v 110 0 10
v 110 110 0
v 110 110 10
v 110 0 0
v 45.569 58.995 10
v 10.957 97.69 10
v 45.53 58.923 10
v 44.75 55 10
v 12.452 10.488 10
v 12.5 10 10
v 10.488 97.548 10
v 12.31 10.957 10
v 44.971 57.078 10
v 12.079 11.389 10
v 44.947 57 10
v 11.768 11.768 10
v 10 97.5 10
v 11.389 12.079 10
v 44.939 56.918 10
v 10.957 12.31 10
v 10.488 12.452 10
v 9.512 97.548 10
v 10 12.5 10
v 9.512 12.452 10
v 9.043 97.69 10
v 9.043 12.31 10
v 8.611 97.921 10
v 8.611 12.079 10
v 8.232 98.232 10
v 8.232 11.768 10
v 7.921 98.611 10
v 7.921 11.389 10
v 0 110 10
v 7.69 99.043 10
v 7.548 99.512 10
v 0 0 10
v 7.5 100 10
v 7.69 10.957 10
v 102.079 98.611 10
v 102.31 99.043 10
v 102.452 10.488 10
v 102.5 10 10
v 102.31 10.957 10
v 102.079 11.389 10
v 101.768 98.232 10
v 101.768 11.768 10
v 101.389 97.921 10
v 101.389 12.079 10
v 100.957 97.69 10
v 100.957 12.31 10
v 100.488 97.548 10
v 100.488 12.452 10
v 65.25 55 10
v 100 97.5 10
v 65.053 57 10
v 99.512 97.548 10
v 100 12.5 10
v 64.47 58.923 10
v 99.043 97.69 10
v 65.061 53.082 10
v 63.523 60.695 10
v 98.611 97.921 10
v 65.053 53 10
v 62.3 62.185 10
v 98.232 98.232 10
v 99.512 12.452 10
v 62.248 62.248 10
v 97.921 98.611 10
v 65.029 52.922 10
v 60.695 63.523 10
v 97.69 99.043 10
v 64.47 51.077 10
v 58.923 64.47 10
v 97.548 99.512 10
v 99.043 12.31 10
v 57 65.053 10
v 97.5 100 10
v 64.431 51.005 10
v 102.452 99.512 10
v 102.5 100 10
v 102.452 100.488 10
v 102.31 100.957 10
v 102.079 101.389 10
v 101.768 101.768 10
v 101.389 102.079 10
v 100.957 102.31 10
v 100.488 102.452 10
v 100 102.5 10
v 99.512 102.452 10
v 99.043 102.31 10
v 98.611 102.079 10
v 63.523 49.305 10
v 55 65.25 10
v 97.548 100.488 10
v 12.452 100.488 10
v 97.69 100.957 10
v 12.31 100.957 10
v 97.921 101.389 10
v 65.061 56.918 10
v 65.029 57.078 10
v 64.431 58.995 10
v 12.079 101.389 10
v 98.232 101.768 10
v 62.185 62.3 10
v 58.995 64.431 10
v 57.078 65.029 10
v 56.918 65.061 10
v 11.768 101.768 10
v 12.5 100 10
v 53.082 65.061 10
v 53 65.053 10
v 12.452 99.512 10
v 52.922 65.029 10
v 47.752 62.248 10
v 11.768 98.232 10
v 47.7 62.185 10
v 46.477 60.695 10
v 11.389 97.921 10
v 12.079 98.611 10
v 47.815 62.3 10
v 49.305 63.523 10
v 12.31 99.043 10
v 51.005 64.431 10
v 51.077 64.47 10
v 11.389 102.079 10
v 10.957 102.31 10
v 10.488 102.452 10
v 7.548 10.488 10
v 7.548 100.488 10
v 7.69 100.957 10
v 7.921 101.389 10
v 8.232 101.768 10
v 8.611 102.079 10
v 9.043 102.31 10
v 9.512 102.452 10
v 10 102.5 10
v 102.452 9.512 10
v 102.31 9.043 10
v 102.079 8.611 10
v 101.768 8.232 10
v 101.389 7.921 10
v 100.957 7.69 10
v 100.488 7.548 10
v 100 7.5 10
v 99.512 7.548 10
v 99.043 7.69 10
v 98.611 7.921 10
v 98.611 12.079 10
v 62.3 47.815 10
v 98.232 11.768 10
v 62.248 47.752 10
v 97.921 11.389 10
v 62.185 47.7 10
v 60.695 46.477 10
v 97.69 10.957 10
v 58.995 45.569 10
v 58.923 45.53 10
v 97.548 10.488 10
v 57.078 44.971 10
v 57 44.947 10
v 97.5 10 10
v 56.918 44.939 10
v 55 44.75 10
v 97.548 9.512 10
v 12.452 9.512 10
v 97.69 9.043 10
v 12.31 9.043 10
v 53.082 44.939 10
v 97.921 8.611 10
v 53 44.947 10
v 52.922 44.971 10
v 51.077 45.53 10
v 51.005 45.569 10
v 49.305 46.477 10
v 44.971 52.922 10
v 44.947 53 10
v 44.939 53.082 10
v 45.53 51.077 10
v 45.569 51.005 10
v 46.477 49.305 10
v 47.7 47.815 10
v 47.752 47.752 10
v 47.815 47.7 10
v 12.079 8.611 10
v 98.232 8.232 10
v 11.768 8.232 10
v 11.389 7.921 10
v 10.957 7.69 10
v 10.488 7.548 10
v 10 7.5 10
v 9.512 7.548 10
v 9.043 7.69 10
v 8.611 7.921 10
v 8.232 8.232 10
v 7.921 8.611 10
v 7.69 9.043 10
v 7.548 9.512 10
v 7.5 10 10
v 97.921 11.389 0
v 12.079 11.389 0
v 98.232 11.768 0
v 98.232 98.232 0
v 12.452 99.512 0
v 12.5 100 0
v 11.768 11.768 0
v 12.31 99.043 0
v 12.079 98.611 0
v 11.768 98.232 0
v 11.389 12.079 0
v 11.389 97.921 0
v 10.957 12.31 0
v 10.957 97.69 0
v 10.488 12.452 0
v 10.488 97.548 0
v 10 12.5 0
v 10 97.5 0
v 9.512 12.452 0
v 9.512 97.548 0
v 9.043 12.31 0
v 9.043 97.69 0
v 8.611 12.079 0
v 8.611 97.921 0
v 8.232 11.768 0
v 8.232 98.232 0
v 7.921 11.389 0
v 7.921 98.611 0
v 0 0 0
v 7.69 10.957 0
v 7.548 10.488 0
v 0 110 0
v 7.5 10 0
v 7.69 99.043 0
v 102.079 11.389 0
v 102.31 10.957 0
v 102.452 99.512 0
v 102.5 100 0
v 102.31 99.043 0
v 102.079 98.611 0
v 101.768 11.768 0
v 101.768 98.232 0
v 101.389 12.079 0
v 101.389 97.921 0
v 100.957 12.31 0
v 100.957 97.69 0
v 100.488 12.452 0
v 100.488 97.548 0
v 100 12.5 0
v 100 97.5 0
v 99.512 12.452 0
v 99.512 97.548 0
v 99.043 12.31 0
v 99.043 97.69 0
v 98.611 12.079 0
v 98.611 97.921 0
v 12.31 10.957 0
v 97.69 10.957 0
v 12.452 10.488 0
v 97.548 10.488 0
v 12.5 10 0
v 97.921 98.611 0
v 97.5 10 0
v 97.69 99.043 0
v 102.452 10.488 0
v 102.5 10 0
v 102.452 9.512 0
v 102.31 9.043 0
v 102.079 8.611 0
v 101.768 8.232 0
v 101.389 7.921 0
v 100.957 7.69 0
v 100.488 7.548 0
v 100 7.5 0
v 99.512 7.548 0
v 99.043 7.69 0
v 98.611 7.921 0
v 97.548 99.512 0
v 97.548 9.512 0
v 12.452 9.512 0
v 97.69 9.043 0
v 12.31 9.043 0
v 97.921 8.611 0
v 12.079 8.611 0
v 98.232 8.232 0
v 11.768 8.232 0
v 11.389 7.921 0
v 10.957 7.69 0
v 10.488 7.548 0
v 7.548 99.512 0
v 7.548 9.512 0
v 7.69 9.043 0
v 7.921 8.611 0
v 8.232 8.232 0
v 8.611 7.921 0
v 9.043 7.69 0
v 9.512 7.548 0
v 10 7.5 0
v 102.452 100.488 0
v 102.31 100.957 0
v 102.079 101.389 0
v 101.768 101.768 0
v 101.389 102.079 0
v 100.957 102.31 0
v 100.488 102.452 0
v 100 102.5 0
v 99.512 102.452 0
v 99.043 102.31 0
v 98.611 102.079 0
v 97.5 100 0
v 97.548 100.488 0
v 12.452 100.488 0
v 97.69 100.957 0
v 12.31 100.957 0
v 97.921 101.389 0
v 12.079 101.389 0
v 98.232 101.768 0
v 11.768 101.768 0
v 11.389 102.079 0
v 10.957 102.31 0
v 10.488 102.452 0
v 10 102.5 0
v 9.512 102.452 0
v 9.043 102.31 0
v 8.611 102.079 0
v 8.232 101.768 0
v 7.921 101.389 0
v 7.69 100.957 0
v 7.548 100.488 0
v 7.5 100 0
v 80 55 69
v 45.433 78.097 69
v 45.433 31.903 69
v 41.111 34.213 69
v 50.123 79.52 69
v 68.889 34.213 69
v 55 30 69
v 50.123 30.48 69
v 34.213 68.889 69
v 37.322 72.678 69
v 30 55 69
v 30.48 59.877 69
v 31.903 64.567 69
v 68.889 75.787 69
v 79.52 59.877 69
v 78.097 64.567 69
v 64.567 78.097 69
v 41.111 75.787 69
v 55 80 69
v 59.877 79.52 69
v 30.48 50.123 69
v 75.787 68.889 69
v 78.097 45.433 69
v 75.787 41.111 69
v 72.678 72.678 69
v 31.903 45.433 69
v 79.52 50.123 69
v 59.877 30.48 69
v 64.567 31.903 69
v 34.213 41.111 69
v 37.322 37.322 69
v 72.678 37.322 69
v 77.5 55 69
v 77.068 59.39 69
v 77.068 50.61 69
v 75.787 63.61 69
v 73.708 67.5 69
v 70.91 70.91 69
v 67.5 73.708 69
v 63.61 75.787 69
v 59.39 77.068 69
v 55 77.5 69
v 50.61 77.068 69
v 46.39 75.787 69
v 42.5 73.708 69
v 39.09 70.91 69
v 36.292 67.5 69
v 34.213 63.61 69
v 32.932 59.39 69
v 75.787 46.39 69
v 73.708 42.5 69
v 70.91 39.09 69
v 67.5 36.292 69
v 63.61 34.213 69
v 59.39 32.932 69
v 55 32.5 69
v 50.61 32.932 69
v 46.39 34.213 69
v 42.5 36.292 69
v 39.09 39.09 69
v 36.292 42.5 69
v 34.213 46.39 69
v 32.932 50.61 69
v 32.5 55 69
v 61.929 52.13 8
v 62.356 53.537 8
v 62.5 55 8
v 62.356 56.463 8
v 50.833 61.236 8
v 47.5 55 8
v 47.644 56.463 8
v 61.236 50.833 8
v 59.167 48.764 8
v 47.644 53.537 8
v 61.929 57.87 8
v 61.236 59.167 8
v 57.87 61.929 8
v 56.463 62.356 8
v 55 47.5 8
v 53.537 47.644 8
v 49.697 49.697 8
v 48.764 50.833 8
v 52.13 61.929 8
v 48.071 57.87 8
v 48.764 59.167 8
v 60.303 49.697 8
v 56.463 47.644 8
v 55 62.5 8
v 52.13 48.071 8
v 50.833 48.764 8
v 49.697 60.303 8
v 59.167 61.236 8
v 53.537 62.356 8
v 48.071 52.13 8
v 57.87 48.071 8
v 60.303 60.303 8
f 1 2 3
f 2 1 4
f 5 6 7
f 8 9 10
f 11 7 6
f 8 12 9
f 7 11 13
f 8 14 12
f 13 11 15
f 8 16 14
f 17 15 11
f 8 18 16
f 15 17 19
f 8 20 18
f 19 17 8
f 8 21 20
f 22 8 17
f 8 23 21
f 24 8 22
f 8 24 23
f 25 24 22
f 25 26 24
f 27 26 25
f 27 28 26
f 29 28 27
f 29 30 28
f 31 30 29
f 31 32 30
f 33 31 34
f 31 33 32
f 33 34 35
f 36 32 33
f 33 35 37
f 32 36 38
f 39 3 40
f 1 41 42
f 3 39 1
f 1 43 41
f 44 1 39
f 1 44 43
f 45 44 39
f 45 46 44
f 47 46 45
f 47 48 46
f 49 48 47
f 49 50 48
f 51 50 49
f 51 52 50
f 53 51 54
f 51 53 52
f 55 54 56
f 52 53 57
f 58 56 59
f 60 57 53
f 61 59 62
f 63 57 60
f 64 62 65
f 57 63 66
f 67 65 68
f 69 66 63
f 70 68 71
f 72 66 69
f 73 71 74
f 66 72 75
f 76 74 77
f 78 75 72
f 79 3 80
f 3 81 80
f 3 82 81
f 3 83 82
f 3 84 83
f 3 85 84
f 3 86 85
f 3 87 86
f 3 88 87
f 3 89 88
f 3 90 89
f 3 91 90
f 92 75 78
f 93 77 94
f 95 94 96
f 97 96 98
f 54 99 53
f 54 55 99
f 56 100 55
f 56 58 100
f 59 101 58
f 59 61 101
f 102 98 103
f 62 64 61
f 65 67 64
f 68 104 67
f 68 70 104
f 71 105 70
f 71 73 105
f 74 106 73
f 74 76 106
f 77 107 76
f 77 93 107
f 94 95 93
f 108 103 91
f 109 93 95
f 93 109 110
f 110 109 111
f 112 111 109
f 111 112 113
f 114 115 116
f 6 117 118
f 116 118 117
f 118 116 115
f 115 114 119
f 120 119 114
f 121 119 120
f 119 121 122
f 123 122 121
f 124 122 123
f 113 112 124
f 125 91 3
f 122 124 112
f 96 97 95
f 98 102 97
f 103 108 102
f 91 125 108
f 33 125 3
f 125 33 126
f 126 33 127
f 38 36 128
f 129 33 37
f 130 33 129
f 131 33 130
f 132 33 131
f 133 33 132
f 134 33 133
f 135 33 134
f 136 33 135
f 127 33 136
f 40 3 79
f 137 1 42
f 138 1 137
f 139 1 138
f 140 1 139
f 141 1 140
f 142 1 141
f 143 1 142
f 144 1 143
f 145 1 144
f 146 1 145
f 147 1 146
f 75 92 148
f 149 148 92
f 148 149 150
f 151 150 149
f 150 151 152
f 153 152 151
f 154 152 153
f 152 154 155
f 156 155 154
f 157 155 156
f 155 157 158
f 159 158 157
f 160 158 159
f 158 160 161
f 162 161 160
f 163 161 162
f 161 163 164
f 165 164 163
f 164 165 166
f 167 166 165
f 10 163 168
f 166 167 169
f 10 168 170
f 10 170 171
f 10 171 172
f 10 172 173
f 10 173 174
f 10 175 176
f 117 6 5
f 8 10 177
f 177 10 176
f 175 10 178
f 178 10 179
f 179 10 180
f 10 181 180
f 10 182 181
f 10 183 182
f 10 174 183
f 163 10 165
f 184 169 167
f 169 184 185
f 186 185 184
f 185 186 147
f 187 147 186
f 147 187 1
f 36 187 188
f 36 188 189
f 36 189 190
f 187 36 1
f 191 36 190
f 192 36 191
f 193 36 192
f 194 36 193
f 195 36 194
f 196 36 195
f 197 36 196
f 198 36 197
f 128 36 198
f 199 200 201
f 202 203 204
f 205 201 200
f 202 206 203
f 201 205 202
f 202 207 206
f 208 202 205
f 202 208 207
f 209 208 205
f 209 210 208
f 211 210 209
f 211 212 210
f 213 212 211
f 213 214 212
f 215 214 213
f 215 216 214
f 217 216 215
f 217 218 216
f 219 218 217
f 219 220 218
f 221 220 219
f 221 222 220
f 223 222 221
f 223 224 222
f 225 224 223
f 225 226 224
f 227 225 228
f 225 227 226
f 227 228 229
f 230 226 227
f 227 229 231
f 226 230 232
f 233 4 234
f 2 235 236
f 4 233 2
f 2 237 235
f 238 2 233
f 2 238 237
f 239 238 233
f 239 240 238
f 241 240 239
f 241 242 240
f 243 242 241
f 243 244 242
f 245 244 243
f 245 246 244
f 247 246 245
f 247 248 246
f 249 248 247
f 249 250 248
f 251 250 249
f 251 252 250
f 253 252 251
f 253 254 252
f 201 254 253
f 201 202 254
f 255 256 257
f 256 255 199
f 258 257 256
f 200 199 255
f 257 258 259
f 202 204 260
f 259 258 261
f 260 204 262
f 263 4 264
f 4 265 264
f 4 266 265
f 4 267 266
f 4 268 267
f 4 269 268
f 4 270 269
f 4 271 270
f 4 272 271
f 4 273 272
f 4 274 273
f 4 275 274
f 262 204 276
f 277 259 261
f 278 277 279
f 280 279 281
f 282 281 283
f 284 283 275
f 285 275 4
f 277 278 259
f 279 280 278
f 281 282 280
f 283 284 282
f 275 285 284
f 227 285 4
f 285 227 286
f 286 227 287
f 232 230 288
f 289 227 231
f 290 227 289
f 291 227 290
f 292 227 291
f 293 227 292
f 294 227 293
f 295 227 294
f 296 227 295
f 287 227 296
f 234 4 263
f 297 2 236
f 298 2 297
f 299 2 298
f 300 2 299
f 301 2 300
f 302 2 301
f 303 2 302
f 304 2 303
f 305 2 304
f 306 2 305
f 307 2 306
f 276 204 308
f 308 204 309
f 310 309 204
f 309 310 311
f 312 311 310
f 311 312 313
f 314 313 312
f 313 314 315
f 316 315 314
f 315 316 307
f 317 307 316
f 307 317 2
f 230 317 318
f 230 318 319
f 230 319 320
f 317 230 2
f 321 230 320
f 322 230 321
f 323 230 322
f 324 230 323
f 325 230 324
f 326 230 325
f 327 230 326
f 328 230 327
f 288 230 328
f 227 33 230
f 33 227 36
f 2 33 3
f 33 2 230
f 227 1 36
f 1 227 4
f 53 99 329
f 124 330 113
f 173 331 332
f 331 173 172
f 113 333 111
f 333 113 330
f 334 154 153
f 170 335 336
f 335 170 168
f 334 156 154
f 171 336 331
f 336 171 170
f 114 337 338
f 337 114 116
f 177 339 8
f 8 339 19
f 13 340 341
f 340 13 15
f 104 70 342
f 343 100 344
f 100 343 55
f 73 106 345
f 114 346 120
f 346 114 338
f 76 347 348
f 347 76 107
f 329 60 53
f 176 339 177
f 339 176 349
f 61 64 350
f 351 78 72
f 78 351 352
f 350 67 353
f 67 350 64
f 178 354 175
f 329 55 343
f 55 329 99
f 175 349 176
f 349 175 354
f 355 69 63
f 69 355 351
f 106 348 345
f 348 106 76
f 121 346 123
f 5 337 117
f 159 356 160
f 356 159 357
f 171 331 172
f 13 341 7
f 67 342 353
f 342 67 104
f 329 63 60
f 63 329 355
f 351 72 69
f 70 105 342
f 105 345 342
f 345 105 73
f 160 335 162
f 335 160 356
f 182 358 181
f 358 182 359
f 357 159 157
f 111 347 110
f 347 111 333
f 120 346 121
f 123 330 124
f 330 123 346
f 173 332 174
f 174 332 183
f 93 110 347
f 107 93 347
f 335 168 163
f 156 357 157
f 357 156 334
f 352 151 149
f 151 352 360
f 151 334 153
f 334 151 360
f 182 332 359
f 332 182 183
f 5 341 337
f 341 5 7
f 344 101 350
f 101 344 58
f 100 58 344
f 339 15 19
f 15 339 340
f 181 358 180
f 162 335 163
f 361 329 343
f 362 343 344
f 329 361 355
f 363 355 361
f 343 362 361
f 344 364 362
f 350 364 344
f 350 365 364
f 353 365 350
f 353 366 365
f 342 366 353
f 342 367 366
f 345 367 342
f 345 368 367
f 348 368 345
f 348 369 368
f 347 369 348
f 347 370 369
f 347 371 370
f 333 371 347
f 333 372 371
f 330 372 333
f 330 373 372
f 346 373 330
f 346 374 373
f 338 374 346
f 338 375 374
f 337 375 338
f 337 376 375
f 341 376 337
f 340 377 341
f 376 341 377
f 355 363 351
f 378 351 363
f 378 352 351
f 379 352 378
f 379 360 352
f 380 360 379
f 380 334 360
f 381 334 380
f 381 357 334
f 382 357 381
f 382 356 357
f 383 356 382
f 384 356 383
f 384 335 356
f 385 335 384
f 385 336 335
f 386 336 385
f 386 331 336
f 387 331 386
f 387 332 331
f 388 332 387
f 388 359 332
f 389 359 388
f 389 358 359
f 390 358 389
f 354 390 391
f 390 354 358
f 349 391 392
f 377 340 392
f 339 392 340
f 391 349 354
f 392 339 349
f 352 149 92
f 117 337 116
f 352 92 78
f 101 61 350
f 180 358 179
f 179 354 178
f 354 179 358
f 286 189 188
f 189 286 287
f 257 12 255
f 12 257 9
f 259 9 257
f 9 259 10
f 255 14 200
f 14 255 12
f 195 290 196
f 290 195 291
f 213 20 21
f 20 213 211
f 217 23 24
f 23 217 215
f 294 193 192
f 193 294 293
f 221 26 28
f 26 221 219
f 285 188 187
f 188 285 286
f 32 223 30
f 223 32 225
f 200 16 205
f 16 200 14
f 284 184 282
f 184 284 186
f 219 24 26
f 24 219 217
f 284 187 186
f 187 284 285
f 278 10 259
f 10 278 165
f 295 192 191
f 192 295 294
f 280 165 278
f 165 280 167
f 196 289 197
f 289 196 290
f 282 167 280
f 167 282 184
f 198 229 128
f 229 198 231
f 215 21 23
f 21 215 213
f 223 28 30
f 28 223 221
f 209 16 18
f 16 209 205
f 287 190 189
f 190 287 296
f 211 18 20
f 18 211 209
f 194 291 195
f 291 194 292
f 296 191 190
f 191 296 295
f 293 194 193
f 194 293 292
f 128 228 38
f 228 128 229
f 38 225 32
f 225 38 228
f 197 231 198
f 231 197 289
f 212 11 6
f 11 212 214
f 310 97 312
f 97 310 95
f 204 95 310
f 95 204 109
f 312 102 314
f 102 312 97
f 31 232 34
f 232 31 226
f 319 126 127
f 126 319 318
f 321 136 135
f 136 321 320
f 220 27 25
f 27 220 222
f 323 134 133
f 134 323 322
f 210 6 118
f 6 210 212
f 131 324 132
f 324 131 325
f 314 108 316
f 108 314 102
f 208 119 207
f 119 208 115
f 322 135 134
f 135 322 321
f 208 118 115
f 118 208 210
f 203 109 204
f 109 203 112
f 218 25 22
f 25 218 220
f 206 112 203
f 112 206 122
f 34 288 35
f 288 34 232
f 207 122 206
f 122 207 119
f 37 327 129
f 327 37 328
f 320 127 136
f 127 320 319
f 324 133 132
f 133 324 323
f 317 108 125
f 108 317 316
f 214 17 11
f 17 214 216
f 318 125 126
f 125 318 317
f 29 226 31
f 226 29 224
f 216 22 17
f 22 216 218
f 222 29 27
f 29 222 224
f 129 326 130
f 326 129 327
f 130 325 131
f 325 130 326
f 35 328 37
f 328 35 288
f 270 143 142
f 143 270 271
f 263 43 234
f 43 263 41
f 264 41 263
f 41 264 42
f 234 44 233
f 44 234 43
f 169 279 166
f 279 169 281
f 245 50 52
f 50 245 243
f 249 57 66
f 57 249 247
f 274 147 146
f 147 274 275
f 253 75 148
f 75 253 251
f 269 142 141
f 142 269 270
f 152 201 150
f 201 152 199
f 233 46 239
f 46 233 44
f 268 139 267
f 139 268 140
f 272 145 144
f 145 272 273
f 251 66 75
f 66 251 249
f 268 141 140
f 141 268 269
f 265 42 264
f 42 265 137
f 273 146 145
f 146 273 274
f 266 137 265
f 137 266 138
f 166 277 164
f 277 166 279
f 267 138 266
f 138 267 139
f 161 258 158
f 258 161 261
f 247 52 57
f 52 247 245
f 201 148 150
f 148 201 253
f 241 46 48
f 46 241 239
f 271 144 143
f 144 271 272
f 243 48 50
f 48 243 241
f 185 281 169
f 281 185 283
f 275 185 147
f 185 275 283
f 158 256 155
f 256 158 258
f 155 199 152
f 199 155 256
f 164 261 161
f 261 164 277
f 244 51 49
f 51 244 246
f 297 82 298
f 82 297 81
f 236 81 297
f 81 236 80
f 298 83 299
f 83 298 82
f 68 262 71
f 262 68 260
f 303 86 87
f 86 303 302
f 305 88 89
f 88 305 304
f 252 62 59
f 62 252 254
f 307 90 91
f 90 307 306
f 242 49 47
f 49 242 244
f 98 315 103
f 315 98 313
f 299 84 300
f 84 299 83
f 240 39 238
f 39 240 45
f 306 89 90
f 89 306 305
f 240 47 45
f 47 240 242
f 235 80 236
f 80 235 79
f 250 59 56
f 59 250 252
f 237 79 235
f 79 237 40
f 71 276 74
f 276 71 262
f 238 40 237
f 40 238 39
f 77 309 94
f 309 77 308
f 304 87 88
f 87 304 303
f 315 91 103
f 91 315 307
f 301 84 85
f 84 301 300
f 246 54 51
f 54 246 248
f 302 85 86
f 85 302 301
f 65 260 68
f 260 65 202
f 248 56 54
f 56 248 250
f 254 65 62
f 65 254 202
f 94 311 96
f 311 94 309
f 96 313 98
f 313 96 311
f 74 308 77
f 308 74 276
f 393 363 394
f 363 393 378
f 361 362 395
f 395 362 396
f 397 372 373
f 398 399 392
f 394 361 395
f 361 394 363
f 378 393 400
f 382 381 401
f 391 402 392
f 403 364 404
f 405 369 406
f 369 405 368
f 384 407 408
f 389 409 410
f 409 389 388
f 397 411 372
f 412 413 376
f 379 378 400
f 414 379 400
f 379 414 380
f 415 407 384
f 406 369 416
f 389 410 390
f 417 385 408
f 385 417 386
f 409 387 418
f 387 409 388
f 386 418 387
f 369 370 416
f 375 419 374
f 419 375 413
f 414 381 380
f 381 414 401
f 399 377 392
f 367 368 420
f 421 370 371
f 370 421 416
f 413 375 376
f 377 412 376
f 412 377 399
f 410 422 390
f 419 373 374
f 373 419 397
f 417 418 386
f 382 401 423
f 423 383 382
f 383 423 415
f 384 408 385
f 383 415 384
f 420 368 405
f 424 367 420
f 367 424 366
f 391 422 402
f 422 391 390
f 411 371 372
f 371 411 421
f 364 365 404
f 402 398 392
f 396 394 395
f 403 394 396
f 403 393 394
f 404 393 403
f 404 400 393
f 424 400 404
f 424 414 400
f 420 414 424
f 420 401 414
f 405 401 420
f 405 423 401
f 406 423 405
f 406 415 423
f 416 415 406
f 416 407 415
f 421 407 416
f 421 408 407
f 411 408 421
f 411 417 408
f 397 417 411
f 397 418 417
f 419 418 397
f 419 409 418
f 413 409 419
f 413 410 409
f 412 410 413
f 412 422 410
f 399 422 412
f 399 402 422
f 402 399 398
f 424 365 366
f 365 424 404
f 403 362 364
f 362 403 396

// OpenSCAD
$fn = 32;

// ----------------------------------------------------------------------
// Hopper: flanged with square flange
// ----------------------------------------------------------------------

// --- parameters (mm) ---
fl = 110;                 // flange side, X and Y
fl_t = 10;                // flange thickness
cone_h = 60;              // cone height above the flange
top_d = 50;               // cone mouth diameter
bot_d = 20;               // cone spout diameter
wall = 2.5;               // cone wall thickness
hole_r = 2.5;             // flange hole radius
hole_in = 10;             // hole inset from the corners

bore_d = bot_d - 2 * wall;  // spout bore diameter
total_h = fl_t + cone_h - 1;  // overall height

difference() {
  union() {
    cube([fl, fl, fl_t]);
    translate([fl / 2, fl / 2, fl_t - 1])
      cylinder(h = cone_h, d1 = bot_d, d2 = top_d);
  }
  translate([fl / 2, fl / 2, fl_t - 2])
    cylinder(h = cone_h + 1, d1 = bore_d, d2 = top_d - 2 * wall);
  for (sx = [0, 1], sy = [0, 1])
    translate([sx ? fl - hole_in : hole_in,
               sy ? fl - hole_in : hole_in, -1])
      cylinder(r = hole_r, h = fl_t + 2);
}
